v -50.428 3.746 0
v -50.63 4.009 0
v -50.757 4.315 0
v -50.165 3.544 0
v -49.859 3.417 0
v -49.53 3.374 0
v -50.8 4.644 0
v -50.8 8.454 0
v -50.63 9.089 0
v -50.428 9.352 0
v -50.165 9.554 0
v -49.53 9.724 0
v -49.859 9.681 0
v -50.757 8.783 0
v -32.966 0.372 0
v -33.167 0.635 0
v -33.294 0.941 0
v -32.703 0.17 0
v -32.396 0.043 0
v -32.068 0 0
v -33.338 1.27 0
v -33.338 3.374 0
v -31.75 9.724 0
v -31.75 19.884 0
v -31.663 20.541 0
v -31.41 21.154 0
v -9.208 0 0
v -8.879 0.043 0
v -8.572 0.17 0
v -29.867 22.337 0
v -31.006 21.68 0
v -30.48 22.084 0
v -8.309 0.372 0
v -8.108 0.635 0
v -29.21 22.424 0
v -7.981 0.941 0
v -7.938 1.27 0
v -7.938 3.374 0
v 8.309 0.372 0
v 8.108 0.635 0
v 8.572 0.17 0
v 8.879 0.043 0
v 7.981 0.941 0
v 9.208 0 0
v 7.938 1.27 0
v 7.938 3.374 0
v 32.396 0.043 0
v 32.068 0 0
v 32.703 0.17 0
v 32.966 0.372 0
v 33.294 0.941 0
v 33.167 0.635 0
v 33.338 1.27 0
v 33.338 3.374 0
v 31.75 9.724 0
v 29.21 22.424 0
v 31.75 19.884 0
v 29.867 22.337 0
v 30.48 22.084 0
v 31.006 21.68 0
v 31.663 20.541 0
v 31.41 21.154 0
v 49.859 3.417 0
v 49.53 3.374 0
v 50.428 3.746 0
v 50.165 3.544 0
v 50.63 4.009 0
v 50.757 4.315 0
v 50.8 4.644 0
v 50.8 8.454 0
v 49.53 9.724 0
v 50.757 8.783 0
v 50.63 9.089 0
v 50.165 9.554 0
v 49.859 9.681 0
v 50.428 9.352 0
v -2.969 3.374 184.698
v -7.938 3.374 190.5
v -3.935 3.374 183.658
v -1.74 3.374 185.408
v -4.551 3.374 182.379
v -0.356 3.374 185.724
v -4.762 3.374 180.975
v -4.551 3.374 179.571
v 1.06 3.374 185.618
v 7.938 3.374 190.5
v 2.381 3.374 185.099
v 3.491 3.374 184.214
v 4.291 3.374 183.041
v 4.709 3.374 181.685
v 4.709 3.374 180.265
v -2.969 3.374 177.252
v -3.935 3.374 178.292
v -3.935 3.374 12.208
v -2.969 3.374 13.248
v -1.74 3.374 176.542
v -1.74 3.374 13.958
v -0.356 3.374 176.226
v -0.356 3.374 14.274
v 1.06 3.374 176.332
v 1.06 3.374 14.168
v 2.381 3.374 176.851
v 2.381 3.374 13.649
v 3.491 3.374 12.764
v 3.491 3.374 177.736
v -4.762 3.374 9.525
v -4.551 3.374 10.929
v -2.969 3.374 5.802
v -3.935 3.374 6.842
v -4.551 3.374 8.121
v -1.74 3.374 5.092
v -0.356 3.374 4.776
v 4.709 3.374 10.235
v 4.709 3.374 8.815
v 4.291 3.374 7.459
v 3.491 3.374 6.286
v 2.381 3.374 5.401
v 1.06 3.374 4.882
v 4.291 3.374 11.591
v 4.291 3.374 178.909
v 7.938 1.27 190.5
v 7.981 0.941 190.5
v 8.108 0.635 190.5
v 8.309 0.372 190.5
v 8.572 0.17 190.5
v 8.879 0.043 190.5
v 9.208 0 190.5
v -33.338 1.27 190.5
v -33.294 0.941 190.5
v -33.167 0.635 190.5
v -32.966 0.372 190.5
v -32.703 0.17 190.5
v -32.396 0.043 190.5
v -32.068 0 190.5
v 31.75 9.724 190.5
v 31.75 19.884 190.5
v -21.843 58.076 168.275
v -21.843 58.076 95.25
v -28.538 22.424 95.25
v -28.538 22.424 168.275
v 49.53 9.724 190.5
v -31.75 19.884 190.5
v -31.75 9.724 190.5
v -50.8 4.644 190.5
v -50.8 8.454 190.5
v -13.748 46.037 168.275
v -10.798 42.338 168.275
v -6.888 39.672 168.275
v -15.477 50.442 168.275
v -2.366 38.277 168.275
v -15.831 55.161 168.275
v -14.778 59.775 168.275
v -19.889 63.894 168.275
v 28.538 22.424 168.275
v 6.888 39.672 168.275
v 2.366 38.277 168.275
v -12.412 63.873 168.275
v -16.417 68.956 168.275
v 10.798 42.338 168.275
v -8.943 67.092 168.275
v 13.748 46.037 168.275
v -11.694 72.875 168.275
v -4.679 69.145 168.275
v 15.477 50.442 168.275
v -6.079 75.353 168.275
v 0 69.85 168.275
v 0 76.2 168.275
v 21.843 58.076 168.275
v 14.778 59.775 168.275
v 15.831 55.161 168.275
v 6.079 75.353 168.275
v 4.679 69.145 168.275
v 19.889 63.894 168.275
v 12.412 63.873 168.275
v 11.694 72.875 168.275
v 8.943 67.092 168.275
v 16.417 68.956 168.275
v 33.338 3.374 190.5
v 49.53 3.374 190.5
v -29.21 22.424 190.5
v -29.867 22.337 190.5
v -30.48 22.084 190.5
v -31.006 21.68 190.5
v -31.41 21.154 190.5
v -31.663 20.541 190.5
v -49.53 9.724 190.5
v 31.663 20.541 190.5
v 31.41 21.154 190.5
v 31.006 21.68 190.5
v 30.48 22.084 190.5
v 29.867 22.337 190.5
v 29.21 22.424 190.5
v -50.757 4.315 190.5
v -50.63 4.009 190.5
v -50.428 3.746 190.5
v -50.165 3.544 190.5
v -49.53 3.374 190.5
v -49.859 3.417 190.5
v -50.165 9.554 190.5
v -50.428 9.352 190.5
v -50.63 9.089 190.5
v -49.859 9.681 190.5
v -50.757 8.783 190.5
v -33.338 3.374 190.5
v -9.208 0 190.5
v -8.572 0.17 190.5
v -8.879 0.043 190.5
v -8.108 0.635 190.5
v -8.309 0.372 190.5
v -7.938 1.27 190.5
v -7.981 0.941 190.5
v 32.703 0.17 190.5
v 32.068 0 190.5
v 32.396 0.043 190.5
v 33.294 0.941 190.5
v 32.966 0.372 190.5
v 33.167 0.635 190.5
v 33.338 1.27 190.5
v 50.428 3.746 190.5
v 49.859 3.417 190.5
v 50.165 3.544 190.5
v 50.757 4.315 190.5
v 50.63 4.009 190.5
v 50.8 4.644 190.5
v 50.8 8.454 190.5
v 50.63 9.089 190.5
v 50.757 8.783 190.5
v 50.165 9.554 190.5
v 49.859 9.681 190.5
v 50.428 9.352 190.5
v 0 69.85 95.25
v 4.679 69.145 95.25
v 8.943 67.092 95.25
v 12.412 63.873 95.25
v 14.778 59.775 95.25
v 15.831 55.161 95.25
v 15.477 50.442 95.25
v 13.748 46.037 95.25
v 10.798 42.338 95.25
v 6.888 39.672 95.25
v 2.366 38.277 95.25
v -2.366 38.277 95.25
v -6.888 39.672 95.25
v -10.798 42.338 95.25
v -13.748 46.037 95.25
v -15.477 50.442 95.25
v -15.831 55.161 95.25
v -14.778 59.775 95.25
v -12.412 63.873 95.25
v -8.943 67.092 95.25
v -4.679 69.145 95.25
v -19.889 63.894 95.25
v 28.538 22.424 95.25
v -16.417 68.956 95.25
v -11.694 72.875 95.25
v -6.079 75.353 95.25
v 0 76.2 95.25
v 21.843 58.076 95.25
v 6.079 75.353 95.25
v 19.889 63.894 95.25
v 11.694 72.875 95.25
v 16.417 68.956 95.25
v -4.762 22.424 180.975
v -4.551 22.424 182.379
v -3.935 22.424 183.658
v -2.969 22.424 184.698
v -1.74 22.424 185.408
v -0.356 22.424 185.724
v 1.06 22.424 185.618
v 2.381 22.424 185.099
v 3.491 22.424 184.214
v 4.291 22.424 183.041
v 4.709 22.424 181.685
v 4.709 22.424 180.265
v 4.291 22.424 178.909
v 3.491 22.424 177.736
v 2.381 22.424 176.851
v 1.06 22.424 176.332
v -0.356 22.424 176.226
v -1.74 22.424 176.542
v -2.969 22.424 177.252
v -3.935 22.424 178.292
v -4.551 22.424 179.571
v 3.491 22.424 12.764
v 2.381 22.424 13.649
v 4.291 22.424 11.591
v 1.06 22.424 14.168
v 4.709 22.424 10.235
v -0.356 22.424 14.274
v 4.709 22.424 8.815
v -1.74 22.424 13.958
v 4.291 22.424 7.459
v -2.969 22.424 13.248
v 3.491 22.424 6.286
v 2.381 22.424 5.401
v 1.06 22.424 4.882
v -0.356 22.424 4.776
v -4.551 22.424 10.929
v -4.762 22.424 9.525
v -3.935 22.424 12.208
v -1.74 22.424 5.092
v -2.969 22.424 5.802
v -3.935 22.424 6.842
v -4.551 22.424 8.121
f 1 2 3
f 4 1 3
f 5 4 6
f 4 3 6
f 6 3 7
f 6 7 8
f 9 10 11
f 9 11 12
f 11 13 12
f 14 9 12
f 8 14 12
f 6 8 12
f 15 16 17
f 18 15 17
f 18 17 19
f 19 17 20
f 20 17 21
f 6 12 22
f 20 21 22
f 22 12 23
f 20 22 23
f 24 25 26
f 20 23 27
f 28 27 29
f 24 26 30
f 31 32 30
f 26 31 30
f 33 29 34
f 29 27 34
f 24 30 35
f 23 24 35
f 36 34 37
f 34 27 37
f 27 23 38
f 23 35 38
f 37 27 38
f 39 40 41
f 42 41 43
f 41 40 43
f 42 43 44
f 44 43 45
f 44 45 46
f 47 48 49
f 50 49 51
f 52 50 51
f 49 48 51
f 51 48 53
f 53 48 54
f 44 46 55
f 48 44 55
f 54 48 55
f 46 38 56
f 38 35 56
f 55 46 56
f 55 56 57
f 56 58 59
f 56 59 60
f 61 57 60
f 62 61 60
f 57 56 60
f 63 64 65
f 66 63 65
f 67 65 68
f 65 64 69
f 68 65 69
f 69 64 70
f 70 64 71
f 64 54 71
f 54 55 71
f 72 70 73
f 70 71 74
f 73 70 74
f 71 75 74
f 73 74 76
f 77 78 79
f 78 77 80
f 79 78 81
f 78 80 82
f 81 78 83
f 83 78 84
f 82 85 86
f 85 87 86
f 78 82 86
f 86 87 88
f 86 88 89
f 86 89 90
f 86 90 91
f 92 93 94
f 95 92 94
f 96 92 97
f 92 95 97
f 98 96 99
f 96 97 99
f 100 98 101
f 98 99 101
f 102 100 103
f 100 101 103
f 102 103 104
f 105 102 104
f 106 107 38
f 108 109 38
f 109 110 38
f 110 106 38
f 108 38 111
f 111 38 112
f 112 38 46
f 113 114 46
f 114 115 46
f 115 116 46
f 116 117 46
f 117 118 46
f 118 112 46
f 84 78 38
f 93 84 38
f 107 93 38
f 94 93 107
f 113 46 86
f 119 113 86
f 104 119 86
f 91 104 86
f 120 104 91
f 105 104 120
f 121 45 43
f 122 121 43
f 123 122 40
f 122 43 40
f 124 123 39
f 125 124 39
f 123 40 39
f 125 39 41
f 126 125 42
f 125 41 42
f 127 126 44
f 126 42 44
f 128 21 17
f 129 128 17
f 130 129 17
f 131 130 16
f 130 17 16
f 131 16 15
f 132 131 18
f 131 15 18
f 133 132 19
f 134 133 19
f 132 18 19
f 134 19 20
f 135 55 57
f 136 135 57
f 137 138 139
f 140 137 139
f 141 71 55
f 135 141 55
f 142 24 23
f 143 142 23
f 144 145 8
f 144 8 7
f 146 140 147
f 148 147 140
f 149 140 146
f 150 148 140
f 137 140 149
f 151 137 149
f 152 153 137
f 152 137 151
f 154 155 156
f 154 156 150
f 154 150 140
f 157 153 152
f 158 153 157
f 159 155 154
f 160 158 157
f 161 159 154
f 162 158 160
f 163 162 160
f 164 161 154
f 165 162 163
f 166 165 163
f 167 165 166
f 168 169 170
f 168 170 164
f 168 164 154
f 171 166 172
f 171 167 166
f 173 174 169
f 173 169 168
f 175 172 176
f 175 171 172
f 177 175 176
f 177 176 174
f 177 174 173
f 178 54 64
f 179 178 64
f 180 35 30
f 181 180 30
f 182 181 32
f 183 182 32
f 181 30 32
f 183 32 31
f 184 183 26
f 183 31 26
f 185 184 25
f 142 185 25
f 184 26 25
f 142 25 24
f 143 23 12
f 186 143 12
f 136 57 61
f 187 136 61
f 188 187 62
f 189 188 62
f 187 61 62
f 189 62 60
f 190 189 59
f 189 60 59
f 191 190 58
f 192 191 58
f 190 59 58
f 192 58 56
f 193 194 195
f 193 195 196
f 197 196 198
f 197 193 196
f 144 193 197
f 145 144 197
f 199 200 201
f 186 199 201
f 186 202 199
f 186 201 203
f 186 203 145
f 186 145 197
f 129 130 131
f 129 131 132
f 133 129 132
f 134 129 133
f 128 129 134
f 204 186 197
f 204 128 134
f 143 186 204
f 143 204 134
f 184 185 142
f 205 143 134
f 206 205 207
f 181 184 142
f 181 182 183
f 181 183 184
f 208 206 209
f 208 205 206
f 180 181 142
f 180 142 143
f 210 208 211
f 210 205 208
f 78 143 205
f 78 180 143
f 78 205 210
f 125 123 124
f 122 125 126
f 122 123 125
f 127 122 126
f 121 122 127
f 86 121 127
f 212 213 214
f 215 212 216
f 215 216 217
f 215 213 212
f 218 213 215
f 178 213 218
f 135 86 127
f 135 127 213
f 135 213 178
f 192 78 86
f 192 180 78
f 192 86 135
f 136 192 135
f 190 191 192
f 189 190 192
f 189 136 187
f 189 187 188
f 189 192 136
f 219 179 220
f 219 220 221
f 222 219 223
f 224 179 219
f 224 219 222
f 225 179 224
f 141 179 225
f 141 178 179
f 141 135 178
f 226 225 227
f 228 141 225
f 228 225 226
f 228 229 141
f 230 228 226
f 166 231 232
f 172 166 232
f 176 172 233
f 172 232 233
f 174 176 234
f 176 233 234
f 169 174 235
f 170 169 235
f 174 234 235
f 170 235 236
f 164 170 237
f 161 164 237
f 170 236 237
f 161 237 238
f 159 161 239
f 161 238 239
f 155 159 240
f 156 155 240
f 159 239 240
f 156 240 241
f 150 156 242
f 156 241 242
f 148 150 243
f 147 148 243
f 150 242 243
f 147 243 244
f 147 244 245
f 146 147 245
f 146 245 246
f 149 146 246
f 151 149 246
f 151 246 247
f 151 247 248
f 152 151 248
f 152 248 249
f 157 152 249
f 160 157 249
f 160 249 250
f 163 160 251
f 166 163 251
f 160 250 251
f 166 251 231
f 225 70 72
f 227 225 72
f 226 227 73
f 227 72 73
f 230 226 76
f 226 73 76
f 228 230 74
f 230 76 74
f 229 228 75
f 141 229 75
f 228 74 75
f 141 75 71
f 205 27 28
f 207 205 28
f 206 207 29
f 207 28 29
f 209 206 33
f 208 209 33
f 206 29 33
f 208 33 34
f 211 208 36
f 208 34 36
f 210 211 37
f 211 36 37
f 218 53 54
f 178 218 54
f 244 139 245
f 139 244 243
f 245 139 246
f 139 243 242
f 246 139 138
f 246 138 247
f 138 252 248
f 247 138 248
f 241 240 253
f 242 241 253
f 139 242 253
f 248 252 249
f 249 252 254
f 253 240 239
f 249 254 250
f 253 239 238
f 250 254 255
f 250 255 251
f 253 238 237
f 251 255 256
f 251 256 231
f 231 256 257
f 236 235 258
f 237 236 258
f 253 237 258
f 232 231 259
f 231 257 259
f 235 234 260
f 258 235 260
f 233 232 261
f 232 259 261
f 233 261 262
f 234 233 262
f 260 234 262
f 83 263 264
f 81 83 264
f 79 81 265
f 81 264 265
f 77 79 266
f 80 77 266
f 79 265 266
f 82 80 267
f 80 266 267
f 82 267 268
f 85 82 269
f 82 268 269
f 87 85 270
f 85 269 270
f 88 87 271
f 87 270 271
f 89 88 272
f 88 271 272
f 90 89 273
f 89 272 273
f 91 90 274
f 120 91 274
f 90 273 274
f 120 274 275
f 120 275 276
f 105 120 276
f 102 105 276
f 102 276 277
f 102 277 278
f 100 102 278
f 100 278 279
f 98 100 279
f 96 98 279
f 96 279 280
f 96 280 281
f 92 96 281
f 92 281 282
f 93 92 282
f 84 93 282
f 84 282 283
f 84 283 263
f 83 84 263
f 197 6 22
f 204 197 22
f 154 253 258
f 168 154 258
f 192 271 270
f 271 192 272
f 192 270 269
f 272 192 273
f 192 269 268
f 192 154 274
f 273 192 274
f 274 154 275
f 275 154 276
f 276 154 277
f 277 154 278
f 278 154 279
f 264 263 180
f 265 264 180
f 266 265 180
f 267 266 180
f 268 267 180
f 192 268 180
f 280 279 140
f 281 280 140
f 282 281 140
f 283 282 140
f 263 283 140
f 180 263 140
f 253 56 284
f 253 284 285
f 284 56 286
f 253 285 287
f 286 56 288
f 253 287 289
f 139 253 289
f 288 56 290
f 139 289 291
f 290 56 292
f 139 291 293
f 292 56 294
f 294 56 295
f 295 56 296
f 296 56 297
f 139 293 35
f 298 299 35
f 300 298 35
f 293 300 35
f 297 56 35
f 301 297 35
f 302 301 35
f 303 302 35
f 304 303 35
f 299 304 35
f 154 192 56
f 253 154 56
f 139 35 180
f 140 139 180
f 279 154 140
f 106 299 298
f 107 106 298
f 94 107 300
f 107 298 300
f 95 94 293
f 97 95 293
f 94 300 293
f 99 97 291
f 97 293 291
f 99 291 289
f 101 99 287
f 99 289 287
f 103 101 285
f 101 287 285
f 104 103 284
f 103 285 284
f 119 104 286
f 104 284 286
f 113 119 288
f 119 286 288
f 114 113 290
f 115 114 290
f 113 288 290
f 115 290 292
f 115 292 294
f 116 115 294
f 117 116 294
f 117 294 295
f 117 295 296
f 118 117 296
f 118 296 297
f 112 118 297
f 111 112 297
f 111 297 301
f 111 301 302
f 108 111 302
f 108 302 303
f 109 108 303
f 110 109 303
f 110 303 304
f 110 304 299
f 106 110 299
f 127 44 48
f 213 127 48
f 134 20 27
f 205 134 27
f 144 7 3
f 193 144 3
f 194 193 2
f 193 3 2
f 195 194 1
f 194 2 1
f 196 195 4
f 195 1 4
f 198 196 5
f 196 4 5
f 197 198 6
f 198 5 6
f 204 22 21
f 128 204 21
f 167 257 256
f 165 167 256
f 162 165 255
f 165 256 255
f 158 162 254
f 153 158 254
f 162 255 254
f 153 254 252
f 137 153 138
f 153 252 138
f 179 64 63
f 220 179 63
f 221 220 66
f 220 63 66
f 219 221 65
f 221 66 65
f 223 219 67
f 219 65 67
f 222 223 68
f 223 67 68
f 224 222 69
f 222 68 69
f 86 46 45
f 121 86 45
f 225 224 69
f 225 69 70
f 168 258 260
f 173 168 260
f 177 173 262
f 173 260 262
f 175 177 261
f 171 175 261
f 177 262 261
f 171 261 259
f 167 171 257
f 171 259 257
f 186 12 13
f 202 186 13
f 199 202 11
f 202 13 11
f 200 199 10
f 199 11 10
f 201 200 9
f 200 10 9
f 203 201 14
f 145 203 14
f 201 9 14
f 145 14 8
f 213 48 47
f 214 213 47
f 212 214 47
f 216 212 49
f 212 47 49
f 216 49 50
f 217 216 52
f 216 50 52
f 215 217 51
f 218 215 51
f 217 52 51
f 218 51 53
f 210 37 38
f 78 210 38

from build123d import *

# Parameters (mm, degrees)
F1_DEPTH = 190.5
F4_DEPTH = 73.025
F6_D     = 9.525
F7_D     = 9.525


with BuildPart() as f1:
    # F0 (on Top) → F1 (new body)
    with BuildSketch(Plane.XY):
        with BuildLine():
            Line((-7.9375, 3.373814), (0, 3.373814))
            Line((0, 3.373814), (0, 9.723814))
            Line((0, 9.723814), (-31.75, 9.723814))
            Line((-31.75, 9.723814), (-49.53, 9.723814))
            ThreePointArc((-49.53, 9.723814), (-50.428026, 9.35184), (-50.8, 8.453814))
            Line((-50.8, 8.453814), (-50.8, 4.643814))
            ThreePointArc((-50.8, 4.643814), (-50.428026, 3.745788), (-49.53, 3.373814))
            Line((-49.53, 3.373814), (-33.3375, 3.373814))
            Line((-33.3375, 3.373814), (-7.9375, 3.373814))
        make_face()
        with BuildLine():
            Line((0, 9.723814), (0, 3.373814))
            Line((0, 3.373814), (7.9375, 3.373814))
            Line((7.9375, 3.373814), (33.3375, 3.373814))
            Line((33.3375, 3.373814), (49.53, 3.373814))
            ThreePointArc((49.53, 3.373814), (50.428026, 3.745788), (50.8, 4.643814))
            Line((50.8, 4.643814), (50.8, 8.453814))
            ThreePointArc((50.8, 8.453814), (50.428026, 9.35184), (49.53, 9.723814))
            Line((49.53, 9.723814), (31.75, 9.723814))
            Line((31.75, 9.723814), (0, 9.723814))
        make_face()
        with BuildLine():
            Line((-31.75, 9.723814), (0, 9.723814))
            Line((0, 9.723814), (0, 22.423814))
            Line((0, 22.423814), (-29.21, 22.423814))
            ThreePointArc((-29.21, 22.423814), (-31.006051, 21.679865), (-31.75, 19.883814))
            Line((-31.75, 19.883814), (-31.75, 9.723814))
        make_face()
        with BuildLine():
            Line((0, 22.423814), (0, 9.723814))
            Line((0, 9.723814), (31.75, 9.723814))
            Line((31.75, 9.723814), (31.75, 19.883814))
            ThreePointArc((31.75, 19.883814), (31.006051, 21.679865), (29.21, 22.423814))
            Line((29.21, 22.423814), (0, 22.423814))
        make_face()
        with BuildLine():
            Line((-7.9375, 1.27), (-7.9375, 3.373814))
            Line((-7.9375, 3.373814), (-33.3375, 3.373814))
            Line((-33.3375, 3.373814), (-33.3375, 1.27))
            ThreePointArc((-33.3375, 1.27), (-32.965526, 0.371974), (-32.0675, 0))
            Line((-32.0675, 0), (-9.2075, 0))
            ThreePointArc((-9.2075, 0), (-8.309474, 0.371974), (-7.9375, 1.27))
        make_face()
        with BuildLine():
            Line((33.3375, 3.373814), (7.9375, 3.373814))
            Line((7.9375, 3.373814), (7.9375, 1.27))
            ThreePointArc((7.9375, 1.27), (8.309474, 0.371974), (9.2075, 0))
            Line((9.2075, 0), (32.0675, 0))
            ThreePointArc((32.0675, 0), (32.965526, 0.371974), (33.3375, 1.27))
            Line((33.3375, 1.27), (33.3375, 3.373814))
        make_face()
    extrude(amount=F1_DEPTH)

    # F3 (on offset) → F4 (join)
    with BuildSketch(Plane.XY.offset(95.25)):
        with BuildLine():
            Line((-21.843277, 58.076449), (-28.575, 22.225))
            Line((-28.575, 22.225), (0, 22.225))
            Line((0, 22.225), (0, 31.75))
            ThreePointArc((0, 31.75), (-17.104171, 39.783525), (-21.843277, 58.076449))
        make_face()
        with BuildLine():
            ThreePointArc((0, 76.2), (-14.191475, 71.079171), (-21.843277, 58.076449))
            ThreePointArc((-21.843277, 58.076449), (-17.104171, 39.783525), (0, 31.75))
            Line((0, 31.75), (0, 38.1))
            ThreePointArc((0, 38.1), (-15.875, 53.975), (0, 69.85))
            Line((0, 69.85), (0, 76.2))
        make_face()
        with BuildLine():
            Line((0, 31.75), (0, 22.225))
            Line((0, 22.225), (28.575, 22.225))
            Line((28.575, 22.225), (21.843277, 58.076449))
            ThreePointArc((21.843277, 58.076449), (17.104171, 39.783525), (0, 31.75))
        make_face()
        with BuildLine():
            ThreePointArc((21.843277, 58.076449), (14.191475, 71.079171), (0, 76.2))
            Line((0, 76.2), (0, 69.85))
            ThreePointArc((0, 69.85), (15.875, 53.975), (0, 38.1))
            Line((0, 38.1), (0, 31.75))
            ThreePointArc((0, 31.75), (17.104171, 39.783525), (21.843277, 58.076449))
        make_face()
    extrude(amount=F4_DEPTH)

    # F6 (through all)
    with Locations(Plane.XZ):
        with Locations((0, 180.975)):
            Hole(F6_D / 2)

    # F7 (through all)
    with Locations(Plane.XZ):
        with Locations((0, 9.525)):
            Hole(F7_D / 2)


solid = f1.part
